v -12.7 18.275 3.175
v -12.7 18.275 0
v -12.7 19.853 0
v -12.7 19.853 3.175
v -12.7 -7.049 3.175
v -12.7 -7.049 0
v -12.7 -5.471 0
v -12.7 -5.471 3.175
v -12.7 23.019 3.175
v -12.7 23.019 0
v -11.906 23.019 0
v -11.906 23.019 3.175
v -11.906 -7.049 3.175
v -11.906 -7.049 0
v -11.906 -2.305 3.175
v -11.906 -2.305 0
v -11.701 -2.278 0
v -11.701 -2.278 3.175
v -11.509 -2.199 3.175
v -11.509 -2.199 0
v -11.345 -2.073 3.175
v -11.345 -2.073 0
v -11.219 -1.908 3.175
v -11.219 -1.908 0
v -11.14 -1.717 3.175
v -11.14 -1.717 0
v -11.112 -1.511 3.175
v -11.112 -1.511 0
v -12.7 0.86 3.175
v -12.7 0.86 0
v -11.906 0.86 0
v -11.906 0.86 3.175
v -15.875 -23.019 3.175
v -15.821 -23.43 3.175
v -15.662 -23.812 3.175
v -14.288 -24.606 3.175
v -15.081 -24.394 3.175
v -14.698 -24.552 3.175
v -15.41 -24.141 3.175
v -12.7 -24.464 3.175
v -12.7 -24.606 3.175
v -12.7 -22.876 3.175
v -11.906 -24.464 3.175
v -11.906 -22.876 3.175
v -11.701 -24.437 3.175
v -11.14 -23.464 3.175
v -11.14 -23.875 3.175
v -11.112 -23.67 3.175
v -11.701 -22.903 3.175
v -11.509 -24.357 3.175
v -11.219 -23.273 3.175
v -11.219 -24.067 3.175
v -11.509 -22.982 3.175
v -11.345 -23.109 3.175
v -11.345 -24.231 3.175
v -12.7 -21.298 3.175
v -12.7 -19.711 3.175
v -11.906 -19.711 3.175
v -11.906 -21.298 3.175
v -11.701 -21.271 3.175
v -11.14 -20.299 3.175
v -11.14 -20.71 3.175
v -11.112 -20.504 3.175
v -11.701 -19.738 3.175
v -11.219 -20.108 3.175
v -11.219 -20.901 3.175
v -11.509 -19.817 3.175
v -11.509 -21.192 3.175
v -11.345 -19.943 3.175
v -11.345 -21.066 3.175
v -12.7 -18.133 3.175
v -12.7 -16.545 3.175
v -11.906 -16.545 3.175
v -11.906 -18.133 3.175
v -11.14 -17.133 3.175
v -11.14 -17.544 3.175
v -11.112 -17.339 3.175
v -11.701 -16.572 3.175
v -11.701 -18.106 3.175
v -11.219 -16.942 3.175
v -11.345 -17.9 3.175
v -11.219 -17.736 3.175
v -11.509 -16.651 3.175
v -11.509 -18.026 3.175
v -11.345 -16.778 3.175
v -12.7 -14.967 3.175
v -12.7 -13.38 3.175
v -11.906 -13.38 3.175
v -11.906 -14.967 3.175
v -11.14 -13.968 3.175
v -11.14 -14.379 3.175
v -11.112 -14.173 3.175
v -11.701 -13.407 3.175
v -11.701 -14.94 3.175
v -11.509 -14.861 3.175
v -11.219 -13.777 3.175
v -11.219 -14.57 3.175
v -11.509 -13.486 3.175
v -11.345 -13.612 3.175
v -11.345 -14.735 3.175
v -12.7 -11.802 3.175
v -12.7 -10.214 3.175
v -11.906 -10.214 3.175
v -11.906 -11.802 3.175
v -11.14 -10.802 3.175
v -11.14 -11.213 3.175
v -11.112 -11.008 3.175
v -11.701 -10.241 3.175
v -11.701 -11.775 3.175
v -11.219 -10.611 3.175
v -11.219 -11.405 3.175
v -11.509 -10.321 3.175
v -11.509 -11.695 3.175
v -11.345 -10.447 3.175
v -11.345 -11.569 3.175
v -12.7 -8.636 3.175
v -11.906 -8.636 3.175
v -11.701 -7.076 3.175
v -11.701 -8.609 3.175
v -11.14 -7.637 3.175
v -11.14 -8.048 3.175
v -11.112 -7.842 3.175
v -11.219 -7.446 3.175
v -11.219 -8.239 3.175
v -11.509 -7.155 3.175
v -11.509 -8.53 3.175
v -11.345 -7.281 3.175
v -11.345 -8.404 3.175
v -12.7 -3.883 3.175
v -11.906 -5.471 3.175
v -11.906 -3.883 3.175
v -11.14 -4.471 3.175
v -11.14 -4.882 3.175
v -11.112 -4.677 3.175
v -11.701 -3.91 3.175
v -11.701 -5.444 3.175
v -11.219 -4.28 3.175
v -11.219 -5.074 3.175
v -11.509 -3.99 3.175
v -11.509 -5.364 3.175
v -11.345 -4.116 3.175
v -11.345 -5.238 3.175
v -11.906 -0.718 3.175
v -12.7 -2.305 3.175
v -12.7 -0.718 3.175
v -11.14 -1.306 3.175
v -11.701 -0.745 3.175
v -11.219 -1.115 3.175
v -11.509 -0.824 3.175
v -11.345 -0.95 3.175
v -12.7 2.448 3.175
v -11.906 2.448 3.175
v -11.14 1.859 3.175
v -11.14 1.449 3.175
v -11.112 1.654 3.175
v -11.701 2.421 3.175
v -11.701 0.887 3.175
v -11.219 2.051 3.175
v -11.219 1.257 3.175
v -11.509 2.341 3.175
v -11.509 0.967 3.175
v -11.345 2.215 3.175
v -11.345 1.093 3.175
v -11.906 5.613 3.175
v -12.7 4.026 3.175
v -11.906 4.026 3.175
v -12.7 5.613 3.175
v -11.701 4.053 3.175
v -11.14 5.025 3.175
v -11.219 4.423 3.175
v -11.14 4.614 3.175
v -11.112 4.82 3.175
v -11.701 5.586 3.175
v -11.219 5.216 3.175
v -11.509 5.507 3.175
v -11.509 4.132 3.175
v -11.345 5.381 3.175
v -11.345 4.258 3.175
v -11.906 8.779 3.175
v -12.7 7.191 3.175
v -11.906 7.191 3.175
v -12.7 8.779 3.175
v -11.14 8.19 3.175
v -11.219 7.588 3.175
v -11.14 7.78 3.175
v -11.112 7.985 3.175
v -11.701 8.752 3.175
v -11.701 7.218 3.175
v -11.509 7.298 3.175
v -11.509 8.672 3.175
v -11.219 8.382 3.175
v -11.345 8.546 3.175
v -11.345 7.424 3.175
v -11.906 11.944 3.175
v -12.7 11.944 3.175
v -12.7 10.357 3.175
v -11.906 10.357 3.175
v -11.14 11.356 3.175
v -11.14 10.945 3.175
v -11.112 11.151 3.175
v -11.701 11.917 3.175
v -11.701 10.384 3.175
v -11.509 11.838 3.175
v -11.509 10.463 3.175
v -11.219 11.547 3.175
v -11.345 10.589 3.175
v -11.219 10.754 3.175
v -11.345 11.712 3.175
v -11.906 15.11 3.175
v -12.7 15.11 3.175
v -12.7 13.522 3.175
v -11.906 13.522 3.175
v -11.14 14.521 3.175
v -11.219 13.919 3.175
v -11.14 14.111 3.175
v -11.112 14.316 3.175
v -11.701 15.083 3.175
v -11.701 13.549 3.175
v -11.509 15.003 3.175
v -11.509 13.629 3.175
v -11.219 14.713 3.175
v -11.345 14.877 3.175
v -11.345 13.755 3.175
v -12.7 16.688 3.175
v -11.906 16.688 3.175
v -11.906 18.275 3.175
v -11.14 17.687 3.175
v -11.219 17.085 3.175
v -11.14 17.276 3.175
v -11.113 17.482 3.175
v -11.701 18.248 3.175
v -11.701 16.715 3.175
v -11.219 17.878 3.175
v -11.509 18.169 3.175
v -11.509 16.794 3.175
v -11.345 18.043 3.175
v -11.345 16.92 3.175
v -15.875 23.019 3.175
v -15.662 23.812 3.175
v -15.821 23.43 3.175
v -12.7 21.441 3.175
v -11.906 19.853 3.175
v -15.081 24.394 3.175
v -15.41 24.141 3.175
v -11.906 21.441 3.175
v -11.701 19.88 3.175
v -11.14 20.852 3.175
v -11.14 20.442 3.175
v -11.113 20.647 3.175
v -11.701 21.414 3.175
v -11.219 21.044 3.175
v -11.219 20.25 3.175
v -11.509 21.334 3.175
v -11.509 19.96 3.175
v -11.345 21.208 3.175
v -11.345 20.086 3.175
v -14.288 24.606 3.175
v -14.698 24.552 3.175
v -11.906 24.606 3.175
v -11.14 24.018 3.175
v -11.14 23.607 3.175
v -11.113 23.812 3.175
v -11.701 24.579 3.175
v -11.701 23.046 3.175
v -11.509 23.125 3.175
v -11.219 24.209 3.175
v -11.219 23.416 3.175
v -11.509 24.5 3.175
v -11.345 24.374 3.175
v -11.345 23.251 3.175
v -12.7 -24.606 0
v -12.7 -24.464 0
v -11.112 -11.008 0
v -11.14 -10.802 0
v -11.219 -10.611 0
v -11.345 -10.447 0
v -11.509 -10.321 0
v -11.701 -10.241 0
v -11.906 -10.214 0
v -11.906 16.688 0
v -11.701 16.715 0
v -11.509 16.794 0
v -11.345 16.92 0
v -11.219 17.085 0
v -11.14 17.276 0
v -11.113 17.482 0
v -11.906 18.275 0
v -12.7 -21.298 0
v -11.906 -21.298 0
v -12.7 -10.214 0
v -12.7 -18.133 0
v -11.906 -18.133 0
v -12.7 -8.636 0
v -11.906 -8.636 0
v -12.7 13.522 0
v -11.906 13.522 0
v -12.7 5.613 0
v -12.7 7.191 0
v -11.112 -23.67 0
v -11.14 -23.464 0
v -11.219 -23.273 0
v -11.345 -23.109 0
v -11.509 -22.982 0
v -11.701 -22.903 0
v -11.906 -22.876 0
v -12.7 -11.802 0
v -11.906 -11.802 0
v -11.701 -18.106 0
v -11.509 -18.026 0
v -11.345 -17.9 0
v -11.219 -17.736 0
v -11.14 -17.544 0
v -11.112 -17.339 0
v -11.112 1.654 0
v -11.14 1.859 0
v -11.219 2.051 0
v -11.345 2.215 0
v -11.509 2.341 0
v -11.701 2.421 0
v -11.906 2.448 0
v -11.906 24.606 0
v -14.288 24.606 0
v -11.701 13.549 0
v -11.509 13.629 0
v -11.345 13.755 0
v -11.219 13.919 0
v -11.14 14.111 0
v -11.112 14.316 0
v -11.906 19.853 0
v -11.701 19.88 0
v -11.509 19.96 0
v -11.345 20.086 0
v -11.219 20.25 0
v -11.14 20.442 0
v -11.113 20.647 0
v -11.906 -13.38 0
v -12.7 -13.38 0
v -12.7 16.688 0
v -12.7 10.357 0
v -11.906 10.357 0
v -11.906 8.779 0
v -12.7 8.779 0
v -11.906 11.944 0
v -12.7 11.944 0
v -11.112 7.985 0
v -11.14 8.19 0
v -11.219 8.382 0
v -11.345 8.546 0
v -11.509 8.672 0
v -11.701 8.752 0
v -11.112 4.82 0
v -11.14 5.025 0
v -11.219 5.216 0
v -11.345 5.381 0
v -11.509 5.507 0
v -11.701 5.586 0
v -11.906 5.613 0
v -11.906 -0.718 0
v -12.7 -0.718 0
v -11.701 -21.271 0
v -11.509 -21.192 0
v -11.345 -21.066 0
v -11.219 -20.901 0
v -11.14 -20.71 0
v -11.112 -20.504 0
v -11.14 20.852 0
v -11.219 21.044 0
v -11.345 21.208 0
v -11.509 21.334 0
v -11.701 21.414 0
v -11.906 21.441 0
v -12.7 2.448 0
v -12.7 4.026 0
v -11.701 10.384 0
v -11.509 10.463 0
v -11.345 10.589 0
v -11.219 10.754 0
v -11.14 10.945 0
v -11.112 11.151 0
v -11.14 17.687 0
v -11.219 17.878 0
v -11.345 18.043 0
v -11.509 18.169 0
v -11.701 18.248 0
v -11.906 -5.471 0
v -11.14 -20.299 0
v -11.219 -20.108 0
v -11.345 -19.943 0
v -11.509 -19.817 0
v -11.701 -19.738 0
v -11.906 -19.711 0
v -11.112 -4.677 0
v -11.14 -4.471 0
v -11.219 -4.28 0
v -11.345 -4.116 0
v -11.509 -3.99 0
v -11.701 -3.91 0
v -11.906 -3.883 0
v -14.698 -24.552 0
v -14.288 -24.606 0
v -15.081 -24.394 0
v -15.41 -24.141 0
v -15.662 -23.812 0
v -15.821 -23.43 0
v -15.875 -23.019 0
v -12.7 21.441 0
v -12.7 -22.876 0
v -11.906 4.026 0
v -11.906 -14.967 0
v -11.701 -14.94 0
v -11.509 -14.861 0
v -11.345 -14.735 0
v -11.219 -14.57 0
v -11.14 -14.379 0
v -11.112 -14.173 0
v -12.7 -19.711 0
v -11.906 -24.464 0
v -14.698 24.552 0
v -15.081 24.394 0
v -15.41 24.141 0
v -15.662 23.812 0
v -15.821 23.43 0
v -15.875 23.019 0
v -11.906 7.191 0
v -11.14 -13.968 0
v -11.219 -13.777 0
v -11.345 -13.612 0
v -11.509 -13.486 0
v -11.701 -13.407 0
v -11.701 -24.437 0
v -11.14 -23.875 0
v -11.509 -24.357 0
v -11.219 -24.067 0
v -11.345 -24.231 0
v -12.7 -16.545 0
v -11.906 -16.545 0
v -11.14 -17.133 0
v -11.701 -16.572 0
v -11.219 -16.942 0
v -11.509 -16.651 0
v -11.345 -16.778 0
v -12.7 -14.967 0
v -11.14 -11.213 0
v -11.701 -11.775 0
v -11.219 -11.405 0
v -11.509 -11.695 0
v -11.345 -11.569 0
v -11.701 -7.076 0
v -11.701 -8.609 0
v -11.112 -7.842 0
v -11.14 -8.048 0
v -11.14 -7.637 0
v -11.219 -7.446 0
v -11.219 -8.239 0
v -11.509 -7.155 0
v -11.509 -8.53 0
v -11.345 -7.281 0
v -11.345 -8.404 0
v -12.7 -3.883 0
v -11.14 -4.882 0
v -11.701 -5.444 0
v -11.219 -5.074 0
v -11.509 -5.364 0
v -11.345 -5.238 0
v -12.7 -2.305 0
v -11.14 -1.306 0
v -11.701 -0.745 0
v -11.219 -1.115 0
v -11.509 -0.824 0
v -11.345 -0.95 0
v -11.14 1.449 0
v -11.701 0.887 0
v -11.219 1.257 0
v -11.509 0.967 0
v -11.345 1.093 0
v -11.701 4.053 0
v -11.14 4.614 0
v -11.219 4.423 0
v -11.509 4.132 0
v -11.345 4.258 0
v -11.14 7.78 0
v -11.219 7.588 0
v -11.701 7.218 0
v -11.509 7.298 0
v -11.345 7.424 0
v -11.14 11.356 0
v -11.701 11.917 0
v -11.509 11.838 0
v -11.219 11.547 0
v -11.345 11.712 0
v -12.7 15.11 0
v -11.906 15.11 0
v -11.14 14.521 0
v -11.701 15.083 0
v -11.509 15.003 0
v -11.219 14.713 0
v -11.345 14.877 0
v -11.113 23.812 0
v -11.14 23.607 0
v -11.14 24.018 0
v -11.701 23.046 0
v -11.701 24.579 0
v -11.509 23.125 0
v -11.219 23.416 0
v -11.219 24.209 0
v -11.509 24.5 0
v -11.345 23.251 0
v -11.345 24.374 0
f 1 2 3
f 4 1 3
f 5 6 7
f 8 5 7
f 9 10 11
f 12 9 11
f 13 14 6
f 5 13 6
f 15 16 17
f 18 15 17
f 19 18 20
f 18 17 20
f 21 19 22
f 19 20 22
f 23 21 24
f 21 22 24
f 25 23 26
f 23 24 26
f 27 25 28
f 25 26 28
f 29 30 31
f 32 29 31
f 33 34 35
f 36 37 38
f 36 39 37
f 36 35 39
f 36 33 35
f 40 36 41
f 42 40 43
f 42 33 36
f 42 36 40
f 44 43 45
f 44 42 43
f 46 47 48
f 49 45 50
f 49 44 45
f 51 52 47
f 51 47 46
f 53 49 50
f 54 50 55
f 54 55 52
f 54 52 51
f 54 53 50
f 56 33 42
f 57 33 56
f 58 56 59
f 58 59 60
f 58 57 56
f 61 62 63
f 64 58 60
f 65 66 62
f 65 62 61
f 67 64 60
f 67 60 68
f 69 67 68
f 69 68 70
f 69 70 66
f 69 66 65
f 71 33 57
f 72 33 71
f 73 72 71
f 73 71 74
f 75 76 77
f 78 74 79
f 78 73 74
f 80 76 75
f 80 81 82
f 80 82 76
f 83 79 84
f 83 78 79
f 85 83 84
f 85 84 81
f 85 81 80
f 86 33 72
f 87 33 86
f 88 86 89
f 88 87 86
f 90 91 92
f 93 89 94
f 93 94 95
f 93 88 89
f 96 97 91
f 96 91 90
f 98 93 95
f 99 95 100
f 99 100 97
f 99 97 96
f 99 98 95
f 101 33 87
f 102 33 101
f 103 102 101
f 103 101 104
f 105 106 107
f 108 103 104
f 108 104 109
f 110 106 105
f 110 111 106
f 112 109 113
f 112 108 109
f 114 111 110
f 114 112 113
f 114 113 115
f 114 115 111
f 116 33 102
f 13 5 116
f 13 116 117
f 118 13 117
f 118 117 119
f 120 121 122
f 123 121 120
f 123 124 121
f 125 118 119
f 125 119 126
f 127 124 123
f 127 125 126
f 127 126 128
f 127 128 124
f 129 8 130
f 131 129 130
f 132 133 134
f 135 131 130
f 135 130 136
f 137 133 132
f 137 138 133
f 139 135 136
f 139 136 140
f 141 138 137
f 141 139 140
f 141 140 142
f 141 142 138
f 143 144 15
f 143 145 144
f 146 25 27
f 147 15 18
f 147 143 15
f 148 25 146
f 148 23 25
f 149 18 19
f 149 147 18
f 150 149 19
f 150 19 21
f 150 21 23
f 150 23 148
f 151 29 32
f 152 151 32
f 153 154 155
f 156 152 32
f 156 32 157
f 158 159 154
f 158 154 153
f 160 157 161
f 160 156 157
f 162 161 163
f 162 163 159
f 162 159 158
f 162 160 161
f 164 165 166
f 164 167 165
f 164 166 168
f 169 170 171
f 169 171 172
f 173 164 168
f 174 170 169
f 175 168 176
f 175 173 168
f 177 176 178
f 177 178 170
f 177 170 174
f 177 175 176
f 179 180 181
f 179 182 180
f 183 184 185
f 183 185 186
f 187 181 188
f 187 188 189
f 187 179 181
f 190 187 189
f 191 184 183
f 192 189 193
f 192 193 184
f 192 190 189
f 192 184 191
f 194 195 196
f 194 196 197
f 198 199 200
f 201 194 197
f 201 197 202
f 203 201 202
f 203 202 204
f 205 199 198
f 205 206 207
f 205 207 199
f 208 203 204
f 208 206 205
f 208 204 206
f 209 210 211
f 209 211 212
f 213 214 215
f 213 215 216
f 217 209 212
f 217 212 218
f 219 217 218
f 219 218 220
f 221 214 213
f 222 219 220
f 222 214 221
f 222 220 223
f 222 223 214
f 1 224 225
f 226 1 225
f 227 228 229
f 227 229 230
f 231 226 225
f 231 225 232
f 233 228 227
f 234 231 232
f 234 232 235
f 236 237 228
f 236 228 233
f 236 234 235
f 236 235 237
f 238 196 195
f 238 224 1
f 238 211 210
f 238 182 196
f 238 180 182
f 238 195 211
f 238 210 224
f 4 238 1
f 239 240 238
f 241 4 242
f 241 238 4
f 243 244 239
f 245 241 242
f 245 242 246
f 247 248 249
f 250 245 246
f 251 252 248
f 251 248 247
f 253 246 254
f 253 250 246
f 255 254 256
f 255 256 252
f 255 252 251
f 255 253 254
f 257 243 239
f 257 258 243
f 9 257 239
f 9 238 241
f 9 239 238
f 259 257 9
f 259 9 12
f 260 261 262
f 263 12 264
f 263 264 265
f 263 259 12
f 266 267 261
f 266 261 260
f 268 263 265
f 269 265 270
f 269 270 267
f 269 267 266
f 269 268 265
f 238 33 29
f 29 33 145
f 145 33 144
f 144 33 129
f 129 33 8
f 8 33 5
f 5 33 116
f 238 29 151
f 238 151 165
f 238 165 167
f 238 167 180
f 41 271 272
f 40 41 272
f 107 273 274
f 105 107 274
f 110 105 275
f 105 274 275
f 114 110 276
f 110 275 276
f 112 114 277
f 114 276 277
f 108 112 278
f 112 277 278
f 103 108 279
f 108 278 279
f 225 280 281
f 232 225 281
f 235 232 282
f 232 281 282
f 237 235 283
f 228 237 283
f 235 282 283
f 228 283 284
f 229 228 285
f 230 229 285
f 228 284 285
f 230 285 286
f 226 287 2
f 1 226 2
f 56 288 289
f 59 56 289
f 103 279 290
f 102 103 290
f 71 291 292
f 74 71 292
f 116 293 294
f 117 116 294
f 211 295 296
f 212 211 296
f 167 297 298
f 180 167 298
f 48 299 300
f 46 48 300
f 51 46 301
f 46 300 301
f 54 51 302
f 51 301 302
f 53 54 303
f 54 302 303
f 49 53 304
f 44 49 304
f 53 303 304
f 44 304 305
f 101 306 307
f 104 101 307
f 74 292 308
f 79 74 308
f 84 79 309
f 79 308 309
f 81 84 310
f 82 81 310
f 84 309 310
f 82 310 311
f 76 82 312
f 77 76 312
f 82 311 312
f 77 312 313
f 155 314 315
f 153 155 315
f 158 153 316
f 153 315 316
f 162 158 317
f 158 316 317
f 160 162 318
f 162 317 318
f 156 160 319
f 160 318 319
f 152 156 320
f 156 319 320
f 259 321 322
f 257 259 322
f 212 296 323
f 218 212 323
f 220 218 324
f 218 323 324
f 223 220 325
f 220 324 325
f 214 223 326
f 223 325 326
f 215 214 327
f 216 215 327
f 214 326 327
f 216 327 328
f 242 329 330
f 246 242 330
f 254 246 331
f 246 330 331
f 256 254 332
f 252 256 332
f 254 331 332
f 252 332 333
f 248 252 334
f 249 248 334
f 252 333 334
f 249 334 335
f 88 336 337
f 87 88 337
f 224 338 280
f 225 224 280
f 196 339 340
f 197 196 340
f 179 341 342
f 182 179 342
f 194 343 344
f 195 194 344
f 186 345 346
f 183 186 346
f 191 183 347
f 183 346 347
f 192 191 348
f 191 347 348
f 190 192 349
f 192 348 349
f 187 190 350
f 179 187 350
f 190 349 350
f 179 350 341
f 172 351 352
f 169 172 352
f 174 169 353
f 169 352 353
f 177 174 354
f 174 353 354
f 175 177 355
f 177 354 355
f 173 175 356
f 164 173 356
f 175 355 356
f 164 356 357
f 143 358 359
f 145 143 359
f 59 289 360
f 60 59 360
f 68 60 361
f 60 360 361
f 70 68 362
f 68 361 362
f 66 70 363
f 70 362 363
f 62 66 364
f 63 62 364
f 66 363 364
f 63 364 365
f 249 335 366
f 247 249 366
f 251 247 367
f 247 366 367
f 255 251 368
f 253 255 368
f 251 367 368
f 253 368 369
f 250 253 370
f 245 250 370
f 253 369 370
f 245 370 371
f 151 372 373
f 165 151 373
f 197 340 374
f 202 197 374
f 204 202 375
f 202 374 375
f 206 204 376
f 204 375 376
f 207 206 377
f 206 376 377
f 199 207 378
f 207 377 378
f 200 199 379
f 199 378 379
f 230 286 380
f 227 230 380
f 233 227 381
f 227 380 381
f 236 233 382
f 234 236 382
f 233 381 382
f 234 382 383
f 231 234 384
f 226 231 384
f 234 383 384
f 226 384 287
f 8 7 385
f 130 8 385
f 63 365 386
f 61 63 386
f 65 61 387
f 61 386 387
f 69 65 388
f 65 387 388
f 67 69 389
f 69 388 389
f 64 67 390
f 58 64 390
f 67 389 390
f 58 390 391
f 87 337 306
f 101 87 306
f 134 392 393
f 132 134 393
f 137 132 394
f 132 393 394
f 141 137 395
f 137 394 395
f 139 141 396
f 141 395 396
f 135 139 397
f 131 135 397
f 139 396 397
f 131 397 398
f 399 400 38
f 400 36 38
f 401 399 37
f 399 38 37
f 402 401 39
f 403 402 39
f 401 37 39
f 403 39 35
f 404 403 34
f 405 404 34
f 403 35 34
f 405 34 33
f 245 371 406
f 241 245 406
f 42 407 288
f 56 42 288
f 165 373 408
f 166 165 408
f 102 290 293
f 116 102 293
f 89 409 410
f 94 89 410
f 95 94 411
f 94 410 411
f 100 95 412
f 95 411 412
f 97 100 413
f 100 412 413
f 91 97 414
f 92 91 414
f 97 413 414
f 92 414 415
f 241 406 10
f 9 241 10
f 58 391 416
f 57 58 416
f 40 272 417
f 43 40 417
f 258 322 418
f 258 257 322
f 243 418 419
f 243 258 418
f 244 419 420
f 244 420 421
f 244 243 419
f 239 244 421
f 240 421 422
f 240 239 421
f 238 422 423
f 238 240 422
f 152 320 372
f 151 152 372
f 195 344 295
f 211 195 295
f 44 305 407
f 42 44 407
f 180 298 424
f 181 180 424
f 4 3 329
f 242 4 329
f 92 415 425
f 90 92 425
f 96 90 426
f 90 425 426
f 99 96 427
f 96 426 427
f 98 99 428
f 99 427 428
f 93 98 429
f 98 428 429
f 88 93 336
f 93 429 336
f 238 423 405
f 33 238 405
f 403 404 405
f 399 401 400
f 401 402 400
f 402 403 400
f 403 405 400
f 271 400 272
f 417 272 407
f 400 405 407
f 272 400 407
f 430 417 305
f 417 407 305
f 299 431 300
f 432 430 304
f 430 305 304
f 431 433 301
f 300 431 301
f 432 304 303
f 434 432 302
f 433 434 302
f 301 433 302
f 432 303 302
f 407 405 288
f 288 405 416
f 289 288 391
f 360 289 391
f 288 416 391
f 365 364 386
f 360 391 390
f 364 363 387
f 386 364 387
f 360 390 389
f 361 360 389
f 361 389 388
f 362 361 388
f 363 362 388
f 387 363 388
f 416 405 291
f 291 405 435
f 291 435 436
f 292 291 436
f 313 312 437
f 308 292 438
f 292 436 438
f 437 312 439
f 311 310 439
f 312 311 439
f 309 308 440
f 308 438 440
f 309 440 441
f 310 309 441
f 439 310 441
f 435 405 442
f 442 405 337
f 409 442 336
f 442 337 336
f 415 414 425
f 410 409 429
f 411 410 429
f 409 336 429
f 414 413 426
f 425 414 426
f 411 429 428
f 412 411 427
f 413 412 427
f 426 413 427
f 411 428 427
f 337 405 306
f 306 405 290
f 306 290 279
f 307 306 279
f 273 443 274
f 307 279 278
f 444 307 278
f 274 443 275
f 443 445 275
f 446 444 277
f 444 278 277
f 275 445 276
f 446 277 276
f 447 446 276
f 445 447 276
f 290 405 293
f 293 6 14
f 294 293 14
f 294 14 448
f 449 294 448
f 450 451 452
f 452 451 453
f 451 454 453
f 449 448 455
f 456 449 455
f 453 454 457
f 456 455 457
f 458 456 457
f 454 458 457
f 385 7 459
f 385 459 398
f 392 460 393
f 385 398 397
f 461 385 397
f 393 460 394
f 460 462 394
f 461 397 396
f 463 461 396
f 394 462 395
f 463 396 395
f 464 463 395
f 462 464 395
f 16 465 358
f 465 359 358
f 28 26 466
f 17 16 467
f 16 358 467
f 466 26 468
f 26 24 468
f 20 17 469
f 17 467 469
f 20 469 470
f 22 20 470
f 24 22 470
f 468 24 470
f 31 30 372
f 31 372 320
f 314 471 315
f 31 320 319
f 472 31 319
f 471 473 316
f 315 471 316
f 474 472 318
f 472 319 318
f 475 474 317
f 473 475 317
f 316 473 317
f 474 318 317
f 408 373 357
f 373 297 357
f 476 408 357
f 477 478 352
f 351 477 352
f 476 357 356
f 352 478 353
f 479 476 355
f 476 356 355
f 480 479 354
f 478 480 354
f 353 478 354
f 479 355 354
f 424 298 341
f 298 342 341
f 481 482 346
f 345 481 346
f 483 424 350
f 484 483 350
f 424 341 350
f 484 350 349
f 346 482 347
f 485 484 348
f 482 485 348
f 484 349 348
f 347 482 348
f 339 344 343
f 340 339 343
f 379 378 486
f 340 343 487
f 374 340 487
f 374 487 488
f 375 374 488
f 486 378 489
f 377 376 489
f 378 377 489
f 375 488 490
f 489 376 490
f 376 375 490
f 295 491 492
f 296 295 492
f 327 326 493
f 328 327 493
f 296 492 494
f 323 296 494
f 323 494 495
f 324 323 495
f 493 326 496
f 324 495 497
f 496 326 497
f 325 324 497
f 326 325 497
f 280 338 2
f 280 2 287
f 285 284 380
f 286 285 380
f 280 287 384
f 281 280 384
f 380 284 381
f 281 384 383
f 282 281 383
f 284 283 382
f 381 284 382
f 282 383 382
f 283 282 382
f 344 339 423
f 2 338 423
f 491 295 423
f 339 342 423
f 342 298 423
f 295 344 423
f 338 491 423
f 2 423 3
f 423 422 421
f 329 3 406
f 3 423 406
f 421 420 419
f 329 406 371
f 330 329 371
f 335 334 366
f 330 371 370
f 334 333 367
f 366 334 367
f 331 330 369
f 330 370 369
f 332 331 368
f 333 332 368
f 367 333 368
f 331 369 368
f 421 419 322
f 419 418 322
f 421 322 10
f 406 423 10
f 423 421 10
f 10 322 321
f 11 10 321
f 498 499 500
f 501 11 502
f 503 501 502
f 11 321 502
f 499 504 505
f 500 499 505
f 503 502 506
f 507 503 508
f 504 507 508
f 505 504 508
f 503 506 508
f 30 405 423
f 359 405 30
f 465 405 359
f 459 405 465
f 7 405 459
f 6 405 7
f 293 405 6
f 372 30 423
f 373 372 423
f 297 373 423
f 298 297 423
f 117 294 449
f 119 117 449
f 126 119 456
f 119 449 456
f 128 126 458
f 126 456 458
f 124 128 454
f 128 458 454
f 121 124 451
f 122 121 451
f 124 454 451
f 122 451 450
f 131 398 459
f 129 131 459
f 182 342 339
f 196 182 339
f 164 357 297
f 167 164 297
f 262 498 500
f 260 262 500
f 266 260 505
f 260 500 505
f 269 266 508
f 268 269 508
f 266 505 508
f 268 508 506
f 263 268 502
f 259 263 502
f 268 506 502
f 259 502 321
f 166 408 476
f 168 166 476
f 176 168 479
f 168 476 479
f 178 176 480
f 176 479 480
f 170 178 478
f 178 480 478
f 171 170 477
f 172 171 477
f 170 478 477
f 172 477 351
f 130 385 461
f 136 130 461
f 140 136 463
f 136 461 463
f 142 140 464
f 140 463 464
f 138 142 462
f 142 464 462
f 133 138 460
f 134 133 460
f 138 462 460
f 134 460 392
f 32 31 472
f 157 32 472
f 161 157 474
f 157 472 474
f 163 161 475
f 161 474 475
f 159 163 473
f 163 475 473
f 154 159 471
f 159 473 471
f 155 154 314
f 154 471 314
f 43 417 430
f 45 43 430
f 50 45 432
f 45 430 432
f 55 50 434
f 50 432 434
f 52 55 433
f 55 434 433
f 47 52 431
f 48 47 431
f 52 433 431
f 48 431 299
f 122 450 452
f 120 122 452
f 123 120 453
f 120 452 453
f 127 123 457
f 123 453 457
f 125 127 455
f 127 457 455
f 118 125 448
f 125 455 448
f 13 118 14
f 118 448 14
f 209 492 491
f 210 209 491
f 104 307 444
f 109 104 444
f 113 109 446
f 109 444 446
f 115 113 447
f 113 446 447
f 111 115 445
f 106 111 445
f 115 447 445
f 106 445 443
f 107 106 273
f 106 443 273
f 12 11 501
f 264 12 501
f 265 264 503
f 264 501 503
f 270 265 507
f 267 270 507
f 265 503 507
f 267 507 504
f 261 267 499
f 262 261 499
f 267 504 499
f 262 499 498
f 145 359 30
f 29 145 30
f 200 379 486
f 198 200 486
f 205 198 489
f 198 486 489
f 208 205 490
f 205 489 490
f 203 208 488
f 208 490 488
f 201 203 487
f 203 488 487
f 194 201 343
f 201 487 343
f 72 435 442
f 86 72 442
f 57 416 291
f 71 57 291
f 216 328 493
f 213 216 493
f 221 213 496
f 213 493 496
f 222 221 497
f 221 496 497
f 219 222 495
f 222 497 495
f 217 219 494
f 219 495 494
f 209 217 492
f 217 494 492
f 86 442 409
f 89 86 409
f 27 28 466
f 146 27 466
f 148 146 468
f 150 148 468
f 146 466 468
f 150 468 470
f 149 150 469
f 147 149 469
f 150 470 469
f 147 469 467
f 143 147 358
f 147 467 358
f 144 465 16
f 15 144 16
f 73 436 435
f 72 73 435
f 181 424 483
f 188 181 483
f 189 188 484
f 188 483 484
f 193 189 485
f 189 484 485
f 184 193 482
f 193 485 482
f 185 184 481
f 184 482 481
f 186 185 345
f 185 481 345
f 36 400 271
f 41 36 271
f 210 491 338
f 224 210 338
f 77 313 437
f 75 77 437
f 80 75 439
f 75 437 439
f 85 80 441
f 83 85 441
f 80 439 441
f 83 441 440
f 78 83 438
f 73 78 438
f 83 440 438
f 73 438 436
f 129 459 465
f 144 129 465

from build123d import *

# Parameters (mm, degrees)
F1_DEPTH = 3.175
F2_R     = 1.5875


with BuildPart() as f1:
    # F0 (on Top) → F1 (new body)
    with BuildSketch(Plane.XY):
        Polygon((-15.875, -24.60625), (-12.7, -24.60625), (-12.7, -24.463631), (-12.7, -22.876131), (-12.7, -21.298139), (-12.7, -19.710639), (-12.7, -18.132646), (-12.7, -16.545146), (-12.7, -14.967154), (-12.7, -13.379654), (-12.7, -11.801662), (-12.7, -10.214162), (-12.7, -8.63617), (-12.7, -7.04867), (-12.7, -5.470678), (-12.7, -3.883178), (-12.7, -2.305186), (-12.7, -0.717686), (-12.7, 0.860306), (-12.7, 2.447806), (-12.7, 4.025798), (-12.7, 5.613298), (-12.7, 7.19129), (-12.7, 8.77879), (-12.7, 10.356782), (-12.7, 11.944282), (-12.7, 13.522274), (-12.7, 15.109774), (-12.7, 16.687766), (-12.7, 18.275266), (-12.7, 19.853258), (-12.7, 21.440758), (-12.7, 23.01875), (-12.7, 24.60625), (-15.875, 24.60625), align=None)
        with BuildLine():
            Line((-12.7, -22.876131), (-12.7, -24.463631))
            Line((-12.7, -24.463631), (-11.90625, -24.463631))
            ThreePointArc((-11.90625, -24.463631), (-11.344984, -24.231147), (-11.1125, -23.669881))
            ThreePointArc((-11.1125, -23.669881), (-11.344984, -23.108615), (-11.90625, -22.876131))
            Line((-11.90625, -22.876131), (-12.7, -22.876131))
        make_face()
        with BuildLine():
            Line((-12.7, -19.710639), (-12.7, -21.298139))
            Line((-12.7, -21.298139), (-11.90625, -21.298139))
            ThreePointArc((-11.90625, -21.298139), (-11.344984, -21.065655), (-11.1125, -20.504389))
            ThreePointArc((-11.1125, -20.504389), (-11.344984, -19.943123), (-11.90625, -19.710639))
            Line((-11.90625, -19.710639), (-12.7, -19.710639))
        make_face()
        with BuildLine():
            Line((-12.7, -16.545146), (-12.7, -18.132646))
            Line((-12.7, -18.132646), (-11.90625, -18.132646))
            ThreePointArc((-11.90625, -18.132646), (-11.344984, -17.900162), (-11.1125, -17.338896))
            ThreePointArc((-11.1125, -17.338896), (-11.344984, -16.77763), (-11.90625, -16.545146))
            Line((-11.90625, -16.545146), (-12.7, -16.545146))
        make_face()
        with BuildLine():
            Line((-12.7, -13.379654), (-12.7, -14.967154))
            Line((-12.7, -14.967154), (-11.90625, -14.967154))
            ThreePointArc((-11.90625, -14.967154), (-11.344984, -14.73467), (-11.1125, -14.173404))
            ThreePointArc((-11.1125, -14.173404), (-11.344984, -13.612138), (-11.90625, -13.379654))
            Line((-11.90625, -13.379654), (-12.7, -13.379654))
        make_face()
        with BuildLine():
            Line((-12.7, -10.214162), (-12.7, -11.801662))
            Line((-12.7, -11.801662), (-11.90625, -11.801662))
            ThreePointArc((-11.90625, -11.801662), (-11.344984, -11.569178), (-11.1125, -11.007912))
            ThreePointArc((-11.1125, -11.007912), (-11.344984, -10.446646), (-11.90625, -10.214162))
            Line((-11.90625, -10.214162), (-12.7, -10.214162))
        make_face()
        with BuildLine():
            Line((-12.7, -7.04867), (-12.7, -8.63617))
            Line((-12.7, -8.63617), (-11.90625, -8.63617))
            ThreePointArc((-11.90625, -8.63617), (-11.344984, -8.403686), (-11.1125, -7.84242))
            ThreePointArc((-11.1125, -7.84242), (-11.344984, -7.281154), (-11.90625, -7.04867))
            Line((-11.90625, -7.04867), (-12.7, -7.04867))
        make_face()
        with BuildLine():
            Line((-12.7, -3.883178), (-12.7, -5.470678))
            Line((-12.7, -5.470678), (-11.90625, -5.470678))
            ThreePointArc((-11.90625, -5.470678), (-11.344984, -5.238194), (-11.1125, -4.676928))
            ThreePointArc((-11.1125, -4.676928), (-11.344984, -4.115662), (-11.90625, -3.883178))
            Line((-11.90625, -3.883178), (-12.7, -3.883178))
        make_face()
        with BuildLine():
            Line((-12.7, -0.717686), (-12.7, -2.305186))
            Line((-12.7, -2.305186), (-11.90625, -2.305186))
            ThreePointArc((-11.90625, -2.305186), (-11.344984, -2.072702), (-11.1125, -1.511436))
            ThreePointArc((-11.1125, -1.511436), (-11.344984, -0.95017), (-11.90625, -0.717686))
            Line((-11.90625, -0.717686), (-12.7, -0.717686))
        make_face()
        with BuildLine():
            Line((-11.90625, 2.447806), (-12.7, 2.447806))
            Line((-12.7, 2.447806), (-12.7, 0.860306))
            Line((-12.7, 0.860306), (-11.90625, 0.860306))
            ThreePointArc((-11.90625, 0.860306), (-11.344984, 1.09279), (-11.1125, 1.654056))
            ThreePointArc((-11.1125, 1.654056), (-11.344984, 2.215322), (-11.90625, 2.447806))
        make_face()
        with BuildLine():
            Line((-11.90625, 5.613298), (-12.7, 5.613298))
            Line((-12.7, 5.613298), (-12.7, 4.025798))
            Line((-12.7, 4.025798), (-11.90625, 4.025798))
            ThreePointArc((-11.90625, 4.025798), (-11.344984, 4.258282), (-11.1125, 4.819548))
            ThreePointArc((-11.1125, 4.819548), (-11.344984, 5.380814), (-11.90625, 5.613298))
        make_face()
        with BuildLine():
            Line((-11.90625, 8.77879), (-12.7, 8.77879))
            Line((-12.7, 8.77879), (-12.7, 7.19129))
            Line((-12.7, 7.19129), (-11.90625, 7.19129))
            ThreePointArc((-11.90625, 7.19129), (-11.344984, 7.423774), (-11.1125, 7.98504))
            ThreePointArc((-11.1125, 7.98504), (-11.344984, 8.546306), (-11.90625, 8.77879))
        make_face()
        with BuildLine():
            Line((-11.90625, 11.944282), (-12.7, 11.944282))
            Line((-12.7, 11.944282), (-12.7, 10.356782))
            Line((-12.7, 10.356782), (-11.90625, 10.356782))
            ThreePointArc((-11.90625, 10.356782), (-11.344984, 10.589266), (-11.1125, 11.150532))
            ThreePointArc((-11.1125, 11.150532), (-11.344984, 11.711798), (-11.90625, 11.944282))
        make_face()
        with BuildLine():
            Line((-11.90625, 15.109774), (-12.7, 15.109774))
            Line((-12.7, 15.109774), (-12.7, 13.522274))
            Line((-12.7, 13.522274), (-11.90625, 13.522274))
            ThreePointArc((-11.90625, 13.522274), (-11.344984, 13.754758), (-11.1125, 14.316024))
            ThreePointArc((-11.1125, 14.316024), (-11.344984, 14.87729), (-11.90625, 15.109774))
        make_face()
        with BuildLine():
            Line((-11.90625, 18.275266), (-12.7, 18.275266))
            Line((-12.7, 18.275266), (-12.7, 16.687766))
            Line((-12.7, 16.687766), (-11.90625, 16.687766))
            ThreePointArc((-11.90625, 16.687766), (-11.344984, 16.92025), (-11.1125, 17.481516))
            ThreePointArc((-11.1125, 17.481516), (-11.344984, 18.042782), (-11.90625, 18.275266))
        make_face()
        with BuildLine():
            Line((-11.90625, 21.440758), (-12.7, 21.440758))
            Line((-12.7, 21.440758), (-12.7, 19.853258))
            Line((-12.7, 19.853258), (-11.90625, 19.853258))
            ThreePointArc((-11.90625, 19.853258), (-11.344984, 20.085742), (-11.1125, 20.647008))
            ThreePointArc((-11.1125, 20.647008), (-11.344984, 21.208274), (-11.90625, 21.440758))
        make_face()
        with BuildLine():
            Line((-11.90625, 24.60625), (-12.7, 24.60625))
            Line((-12.7, 24.60625), (-12.7, 23.01875))
            Line((-12.7, 23.01875), (-11.90625, 23.01875))
            ThreePointArc((-11.90625, 23.01875), (-11.344984, 23.251234), (-11.1125, 23.8125))
            ThreePointArc((-11.1125, 23.8125), (-11.344984, 24.373766), (-11.90625, 24.60625))
        make_face()
    extrude(amount=F1_DEPTH)

    # F2
    f2_edges = [f1.edges().sort_by_distance(p)[0] for p in [
        (-15.875, 24.60625, 1.5875),
        (-15.875, -24.60625, 1.5875),
    ]]
    fillet(f2_edges, radius=F2_R)


solid = f1.part
